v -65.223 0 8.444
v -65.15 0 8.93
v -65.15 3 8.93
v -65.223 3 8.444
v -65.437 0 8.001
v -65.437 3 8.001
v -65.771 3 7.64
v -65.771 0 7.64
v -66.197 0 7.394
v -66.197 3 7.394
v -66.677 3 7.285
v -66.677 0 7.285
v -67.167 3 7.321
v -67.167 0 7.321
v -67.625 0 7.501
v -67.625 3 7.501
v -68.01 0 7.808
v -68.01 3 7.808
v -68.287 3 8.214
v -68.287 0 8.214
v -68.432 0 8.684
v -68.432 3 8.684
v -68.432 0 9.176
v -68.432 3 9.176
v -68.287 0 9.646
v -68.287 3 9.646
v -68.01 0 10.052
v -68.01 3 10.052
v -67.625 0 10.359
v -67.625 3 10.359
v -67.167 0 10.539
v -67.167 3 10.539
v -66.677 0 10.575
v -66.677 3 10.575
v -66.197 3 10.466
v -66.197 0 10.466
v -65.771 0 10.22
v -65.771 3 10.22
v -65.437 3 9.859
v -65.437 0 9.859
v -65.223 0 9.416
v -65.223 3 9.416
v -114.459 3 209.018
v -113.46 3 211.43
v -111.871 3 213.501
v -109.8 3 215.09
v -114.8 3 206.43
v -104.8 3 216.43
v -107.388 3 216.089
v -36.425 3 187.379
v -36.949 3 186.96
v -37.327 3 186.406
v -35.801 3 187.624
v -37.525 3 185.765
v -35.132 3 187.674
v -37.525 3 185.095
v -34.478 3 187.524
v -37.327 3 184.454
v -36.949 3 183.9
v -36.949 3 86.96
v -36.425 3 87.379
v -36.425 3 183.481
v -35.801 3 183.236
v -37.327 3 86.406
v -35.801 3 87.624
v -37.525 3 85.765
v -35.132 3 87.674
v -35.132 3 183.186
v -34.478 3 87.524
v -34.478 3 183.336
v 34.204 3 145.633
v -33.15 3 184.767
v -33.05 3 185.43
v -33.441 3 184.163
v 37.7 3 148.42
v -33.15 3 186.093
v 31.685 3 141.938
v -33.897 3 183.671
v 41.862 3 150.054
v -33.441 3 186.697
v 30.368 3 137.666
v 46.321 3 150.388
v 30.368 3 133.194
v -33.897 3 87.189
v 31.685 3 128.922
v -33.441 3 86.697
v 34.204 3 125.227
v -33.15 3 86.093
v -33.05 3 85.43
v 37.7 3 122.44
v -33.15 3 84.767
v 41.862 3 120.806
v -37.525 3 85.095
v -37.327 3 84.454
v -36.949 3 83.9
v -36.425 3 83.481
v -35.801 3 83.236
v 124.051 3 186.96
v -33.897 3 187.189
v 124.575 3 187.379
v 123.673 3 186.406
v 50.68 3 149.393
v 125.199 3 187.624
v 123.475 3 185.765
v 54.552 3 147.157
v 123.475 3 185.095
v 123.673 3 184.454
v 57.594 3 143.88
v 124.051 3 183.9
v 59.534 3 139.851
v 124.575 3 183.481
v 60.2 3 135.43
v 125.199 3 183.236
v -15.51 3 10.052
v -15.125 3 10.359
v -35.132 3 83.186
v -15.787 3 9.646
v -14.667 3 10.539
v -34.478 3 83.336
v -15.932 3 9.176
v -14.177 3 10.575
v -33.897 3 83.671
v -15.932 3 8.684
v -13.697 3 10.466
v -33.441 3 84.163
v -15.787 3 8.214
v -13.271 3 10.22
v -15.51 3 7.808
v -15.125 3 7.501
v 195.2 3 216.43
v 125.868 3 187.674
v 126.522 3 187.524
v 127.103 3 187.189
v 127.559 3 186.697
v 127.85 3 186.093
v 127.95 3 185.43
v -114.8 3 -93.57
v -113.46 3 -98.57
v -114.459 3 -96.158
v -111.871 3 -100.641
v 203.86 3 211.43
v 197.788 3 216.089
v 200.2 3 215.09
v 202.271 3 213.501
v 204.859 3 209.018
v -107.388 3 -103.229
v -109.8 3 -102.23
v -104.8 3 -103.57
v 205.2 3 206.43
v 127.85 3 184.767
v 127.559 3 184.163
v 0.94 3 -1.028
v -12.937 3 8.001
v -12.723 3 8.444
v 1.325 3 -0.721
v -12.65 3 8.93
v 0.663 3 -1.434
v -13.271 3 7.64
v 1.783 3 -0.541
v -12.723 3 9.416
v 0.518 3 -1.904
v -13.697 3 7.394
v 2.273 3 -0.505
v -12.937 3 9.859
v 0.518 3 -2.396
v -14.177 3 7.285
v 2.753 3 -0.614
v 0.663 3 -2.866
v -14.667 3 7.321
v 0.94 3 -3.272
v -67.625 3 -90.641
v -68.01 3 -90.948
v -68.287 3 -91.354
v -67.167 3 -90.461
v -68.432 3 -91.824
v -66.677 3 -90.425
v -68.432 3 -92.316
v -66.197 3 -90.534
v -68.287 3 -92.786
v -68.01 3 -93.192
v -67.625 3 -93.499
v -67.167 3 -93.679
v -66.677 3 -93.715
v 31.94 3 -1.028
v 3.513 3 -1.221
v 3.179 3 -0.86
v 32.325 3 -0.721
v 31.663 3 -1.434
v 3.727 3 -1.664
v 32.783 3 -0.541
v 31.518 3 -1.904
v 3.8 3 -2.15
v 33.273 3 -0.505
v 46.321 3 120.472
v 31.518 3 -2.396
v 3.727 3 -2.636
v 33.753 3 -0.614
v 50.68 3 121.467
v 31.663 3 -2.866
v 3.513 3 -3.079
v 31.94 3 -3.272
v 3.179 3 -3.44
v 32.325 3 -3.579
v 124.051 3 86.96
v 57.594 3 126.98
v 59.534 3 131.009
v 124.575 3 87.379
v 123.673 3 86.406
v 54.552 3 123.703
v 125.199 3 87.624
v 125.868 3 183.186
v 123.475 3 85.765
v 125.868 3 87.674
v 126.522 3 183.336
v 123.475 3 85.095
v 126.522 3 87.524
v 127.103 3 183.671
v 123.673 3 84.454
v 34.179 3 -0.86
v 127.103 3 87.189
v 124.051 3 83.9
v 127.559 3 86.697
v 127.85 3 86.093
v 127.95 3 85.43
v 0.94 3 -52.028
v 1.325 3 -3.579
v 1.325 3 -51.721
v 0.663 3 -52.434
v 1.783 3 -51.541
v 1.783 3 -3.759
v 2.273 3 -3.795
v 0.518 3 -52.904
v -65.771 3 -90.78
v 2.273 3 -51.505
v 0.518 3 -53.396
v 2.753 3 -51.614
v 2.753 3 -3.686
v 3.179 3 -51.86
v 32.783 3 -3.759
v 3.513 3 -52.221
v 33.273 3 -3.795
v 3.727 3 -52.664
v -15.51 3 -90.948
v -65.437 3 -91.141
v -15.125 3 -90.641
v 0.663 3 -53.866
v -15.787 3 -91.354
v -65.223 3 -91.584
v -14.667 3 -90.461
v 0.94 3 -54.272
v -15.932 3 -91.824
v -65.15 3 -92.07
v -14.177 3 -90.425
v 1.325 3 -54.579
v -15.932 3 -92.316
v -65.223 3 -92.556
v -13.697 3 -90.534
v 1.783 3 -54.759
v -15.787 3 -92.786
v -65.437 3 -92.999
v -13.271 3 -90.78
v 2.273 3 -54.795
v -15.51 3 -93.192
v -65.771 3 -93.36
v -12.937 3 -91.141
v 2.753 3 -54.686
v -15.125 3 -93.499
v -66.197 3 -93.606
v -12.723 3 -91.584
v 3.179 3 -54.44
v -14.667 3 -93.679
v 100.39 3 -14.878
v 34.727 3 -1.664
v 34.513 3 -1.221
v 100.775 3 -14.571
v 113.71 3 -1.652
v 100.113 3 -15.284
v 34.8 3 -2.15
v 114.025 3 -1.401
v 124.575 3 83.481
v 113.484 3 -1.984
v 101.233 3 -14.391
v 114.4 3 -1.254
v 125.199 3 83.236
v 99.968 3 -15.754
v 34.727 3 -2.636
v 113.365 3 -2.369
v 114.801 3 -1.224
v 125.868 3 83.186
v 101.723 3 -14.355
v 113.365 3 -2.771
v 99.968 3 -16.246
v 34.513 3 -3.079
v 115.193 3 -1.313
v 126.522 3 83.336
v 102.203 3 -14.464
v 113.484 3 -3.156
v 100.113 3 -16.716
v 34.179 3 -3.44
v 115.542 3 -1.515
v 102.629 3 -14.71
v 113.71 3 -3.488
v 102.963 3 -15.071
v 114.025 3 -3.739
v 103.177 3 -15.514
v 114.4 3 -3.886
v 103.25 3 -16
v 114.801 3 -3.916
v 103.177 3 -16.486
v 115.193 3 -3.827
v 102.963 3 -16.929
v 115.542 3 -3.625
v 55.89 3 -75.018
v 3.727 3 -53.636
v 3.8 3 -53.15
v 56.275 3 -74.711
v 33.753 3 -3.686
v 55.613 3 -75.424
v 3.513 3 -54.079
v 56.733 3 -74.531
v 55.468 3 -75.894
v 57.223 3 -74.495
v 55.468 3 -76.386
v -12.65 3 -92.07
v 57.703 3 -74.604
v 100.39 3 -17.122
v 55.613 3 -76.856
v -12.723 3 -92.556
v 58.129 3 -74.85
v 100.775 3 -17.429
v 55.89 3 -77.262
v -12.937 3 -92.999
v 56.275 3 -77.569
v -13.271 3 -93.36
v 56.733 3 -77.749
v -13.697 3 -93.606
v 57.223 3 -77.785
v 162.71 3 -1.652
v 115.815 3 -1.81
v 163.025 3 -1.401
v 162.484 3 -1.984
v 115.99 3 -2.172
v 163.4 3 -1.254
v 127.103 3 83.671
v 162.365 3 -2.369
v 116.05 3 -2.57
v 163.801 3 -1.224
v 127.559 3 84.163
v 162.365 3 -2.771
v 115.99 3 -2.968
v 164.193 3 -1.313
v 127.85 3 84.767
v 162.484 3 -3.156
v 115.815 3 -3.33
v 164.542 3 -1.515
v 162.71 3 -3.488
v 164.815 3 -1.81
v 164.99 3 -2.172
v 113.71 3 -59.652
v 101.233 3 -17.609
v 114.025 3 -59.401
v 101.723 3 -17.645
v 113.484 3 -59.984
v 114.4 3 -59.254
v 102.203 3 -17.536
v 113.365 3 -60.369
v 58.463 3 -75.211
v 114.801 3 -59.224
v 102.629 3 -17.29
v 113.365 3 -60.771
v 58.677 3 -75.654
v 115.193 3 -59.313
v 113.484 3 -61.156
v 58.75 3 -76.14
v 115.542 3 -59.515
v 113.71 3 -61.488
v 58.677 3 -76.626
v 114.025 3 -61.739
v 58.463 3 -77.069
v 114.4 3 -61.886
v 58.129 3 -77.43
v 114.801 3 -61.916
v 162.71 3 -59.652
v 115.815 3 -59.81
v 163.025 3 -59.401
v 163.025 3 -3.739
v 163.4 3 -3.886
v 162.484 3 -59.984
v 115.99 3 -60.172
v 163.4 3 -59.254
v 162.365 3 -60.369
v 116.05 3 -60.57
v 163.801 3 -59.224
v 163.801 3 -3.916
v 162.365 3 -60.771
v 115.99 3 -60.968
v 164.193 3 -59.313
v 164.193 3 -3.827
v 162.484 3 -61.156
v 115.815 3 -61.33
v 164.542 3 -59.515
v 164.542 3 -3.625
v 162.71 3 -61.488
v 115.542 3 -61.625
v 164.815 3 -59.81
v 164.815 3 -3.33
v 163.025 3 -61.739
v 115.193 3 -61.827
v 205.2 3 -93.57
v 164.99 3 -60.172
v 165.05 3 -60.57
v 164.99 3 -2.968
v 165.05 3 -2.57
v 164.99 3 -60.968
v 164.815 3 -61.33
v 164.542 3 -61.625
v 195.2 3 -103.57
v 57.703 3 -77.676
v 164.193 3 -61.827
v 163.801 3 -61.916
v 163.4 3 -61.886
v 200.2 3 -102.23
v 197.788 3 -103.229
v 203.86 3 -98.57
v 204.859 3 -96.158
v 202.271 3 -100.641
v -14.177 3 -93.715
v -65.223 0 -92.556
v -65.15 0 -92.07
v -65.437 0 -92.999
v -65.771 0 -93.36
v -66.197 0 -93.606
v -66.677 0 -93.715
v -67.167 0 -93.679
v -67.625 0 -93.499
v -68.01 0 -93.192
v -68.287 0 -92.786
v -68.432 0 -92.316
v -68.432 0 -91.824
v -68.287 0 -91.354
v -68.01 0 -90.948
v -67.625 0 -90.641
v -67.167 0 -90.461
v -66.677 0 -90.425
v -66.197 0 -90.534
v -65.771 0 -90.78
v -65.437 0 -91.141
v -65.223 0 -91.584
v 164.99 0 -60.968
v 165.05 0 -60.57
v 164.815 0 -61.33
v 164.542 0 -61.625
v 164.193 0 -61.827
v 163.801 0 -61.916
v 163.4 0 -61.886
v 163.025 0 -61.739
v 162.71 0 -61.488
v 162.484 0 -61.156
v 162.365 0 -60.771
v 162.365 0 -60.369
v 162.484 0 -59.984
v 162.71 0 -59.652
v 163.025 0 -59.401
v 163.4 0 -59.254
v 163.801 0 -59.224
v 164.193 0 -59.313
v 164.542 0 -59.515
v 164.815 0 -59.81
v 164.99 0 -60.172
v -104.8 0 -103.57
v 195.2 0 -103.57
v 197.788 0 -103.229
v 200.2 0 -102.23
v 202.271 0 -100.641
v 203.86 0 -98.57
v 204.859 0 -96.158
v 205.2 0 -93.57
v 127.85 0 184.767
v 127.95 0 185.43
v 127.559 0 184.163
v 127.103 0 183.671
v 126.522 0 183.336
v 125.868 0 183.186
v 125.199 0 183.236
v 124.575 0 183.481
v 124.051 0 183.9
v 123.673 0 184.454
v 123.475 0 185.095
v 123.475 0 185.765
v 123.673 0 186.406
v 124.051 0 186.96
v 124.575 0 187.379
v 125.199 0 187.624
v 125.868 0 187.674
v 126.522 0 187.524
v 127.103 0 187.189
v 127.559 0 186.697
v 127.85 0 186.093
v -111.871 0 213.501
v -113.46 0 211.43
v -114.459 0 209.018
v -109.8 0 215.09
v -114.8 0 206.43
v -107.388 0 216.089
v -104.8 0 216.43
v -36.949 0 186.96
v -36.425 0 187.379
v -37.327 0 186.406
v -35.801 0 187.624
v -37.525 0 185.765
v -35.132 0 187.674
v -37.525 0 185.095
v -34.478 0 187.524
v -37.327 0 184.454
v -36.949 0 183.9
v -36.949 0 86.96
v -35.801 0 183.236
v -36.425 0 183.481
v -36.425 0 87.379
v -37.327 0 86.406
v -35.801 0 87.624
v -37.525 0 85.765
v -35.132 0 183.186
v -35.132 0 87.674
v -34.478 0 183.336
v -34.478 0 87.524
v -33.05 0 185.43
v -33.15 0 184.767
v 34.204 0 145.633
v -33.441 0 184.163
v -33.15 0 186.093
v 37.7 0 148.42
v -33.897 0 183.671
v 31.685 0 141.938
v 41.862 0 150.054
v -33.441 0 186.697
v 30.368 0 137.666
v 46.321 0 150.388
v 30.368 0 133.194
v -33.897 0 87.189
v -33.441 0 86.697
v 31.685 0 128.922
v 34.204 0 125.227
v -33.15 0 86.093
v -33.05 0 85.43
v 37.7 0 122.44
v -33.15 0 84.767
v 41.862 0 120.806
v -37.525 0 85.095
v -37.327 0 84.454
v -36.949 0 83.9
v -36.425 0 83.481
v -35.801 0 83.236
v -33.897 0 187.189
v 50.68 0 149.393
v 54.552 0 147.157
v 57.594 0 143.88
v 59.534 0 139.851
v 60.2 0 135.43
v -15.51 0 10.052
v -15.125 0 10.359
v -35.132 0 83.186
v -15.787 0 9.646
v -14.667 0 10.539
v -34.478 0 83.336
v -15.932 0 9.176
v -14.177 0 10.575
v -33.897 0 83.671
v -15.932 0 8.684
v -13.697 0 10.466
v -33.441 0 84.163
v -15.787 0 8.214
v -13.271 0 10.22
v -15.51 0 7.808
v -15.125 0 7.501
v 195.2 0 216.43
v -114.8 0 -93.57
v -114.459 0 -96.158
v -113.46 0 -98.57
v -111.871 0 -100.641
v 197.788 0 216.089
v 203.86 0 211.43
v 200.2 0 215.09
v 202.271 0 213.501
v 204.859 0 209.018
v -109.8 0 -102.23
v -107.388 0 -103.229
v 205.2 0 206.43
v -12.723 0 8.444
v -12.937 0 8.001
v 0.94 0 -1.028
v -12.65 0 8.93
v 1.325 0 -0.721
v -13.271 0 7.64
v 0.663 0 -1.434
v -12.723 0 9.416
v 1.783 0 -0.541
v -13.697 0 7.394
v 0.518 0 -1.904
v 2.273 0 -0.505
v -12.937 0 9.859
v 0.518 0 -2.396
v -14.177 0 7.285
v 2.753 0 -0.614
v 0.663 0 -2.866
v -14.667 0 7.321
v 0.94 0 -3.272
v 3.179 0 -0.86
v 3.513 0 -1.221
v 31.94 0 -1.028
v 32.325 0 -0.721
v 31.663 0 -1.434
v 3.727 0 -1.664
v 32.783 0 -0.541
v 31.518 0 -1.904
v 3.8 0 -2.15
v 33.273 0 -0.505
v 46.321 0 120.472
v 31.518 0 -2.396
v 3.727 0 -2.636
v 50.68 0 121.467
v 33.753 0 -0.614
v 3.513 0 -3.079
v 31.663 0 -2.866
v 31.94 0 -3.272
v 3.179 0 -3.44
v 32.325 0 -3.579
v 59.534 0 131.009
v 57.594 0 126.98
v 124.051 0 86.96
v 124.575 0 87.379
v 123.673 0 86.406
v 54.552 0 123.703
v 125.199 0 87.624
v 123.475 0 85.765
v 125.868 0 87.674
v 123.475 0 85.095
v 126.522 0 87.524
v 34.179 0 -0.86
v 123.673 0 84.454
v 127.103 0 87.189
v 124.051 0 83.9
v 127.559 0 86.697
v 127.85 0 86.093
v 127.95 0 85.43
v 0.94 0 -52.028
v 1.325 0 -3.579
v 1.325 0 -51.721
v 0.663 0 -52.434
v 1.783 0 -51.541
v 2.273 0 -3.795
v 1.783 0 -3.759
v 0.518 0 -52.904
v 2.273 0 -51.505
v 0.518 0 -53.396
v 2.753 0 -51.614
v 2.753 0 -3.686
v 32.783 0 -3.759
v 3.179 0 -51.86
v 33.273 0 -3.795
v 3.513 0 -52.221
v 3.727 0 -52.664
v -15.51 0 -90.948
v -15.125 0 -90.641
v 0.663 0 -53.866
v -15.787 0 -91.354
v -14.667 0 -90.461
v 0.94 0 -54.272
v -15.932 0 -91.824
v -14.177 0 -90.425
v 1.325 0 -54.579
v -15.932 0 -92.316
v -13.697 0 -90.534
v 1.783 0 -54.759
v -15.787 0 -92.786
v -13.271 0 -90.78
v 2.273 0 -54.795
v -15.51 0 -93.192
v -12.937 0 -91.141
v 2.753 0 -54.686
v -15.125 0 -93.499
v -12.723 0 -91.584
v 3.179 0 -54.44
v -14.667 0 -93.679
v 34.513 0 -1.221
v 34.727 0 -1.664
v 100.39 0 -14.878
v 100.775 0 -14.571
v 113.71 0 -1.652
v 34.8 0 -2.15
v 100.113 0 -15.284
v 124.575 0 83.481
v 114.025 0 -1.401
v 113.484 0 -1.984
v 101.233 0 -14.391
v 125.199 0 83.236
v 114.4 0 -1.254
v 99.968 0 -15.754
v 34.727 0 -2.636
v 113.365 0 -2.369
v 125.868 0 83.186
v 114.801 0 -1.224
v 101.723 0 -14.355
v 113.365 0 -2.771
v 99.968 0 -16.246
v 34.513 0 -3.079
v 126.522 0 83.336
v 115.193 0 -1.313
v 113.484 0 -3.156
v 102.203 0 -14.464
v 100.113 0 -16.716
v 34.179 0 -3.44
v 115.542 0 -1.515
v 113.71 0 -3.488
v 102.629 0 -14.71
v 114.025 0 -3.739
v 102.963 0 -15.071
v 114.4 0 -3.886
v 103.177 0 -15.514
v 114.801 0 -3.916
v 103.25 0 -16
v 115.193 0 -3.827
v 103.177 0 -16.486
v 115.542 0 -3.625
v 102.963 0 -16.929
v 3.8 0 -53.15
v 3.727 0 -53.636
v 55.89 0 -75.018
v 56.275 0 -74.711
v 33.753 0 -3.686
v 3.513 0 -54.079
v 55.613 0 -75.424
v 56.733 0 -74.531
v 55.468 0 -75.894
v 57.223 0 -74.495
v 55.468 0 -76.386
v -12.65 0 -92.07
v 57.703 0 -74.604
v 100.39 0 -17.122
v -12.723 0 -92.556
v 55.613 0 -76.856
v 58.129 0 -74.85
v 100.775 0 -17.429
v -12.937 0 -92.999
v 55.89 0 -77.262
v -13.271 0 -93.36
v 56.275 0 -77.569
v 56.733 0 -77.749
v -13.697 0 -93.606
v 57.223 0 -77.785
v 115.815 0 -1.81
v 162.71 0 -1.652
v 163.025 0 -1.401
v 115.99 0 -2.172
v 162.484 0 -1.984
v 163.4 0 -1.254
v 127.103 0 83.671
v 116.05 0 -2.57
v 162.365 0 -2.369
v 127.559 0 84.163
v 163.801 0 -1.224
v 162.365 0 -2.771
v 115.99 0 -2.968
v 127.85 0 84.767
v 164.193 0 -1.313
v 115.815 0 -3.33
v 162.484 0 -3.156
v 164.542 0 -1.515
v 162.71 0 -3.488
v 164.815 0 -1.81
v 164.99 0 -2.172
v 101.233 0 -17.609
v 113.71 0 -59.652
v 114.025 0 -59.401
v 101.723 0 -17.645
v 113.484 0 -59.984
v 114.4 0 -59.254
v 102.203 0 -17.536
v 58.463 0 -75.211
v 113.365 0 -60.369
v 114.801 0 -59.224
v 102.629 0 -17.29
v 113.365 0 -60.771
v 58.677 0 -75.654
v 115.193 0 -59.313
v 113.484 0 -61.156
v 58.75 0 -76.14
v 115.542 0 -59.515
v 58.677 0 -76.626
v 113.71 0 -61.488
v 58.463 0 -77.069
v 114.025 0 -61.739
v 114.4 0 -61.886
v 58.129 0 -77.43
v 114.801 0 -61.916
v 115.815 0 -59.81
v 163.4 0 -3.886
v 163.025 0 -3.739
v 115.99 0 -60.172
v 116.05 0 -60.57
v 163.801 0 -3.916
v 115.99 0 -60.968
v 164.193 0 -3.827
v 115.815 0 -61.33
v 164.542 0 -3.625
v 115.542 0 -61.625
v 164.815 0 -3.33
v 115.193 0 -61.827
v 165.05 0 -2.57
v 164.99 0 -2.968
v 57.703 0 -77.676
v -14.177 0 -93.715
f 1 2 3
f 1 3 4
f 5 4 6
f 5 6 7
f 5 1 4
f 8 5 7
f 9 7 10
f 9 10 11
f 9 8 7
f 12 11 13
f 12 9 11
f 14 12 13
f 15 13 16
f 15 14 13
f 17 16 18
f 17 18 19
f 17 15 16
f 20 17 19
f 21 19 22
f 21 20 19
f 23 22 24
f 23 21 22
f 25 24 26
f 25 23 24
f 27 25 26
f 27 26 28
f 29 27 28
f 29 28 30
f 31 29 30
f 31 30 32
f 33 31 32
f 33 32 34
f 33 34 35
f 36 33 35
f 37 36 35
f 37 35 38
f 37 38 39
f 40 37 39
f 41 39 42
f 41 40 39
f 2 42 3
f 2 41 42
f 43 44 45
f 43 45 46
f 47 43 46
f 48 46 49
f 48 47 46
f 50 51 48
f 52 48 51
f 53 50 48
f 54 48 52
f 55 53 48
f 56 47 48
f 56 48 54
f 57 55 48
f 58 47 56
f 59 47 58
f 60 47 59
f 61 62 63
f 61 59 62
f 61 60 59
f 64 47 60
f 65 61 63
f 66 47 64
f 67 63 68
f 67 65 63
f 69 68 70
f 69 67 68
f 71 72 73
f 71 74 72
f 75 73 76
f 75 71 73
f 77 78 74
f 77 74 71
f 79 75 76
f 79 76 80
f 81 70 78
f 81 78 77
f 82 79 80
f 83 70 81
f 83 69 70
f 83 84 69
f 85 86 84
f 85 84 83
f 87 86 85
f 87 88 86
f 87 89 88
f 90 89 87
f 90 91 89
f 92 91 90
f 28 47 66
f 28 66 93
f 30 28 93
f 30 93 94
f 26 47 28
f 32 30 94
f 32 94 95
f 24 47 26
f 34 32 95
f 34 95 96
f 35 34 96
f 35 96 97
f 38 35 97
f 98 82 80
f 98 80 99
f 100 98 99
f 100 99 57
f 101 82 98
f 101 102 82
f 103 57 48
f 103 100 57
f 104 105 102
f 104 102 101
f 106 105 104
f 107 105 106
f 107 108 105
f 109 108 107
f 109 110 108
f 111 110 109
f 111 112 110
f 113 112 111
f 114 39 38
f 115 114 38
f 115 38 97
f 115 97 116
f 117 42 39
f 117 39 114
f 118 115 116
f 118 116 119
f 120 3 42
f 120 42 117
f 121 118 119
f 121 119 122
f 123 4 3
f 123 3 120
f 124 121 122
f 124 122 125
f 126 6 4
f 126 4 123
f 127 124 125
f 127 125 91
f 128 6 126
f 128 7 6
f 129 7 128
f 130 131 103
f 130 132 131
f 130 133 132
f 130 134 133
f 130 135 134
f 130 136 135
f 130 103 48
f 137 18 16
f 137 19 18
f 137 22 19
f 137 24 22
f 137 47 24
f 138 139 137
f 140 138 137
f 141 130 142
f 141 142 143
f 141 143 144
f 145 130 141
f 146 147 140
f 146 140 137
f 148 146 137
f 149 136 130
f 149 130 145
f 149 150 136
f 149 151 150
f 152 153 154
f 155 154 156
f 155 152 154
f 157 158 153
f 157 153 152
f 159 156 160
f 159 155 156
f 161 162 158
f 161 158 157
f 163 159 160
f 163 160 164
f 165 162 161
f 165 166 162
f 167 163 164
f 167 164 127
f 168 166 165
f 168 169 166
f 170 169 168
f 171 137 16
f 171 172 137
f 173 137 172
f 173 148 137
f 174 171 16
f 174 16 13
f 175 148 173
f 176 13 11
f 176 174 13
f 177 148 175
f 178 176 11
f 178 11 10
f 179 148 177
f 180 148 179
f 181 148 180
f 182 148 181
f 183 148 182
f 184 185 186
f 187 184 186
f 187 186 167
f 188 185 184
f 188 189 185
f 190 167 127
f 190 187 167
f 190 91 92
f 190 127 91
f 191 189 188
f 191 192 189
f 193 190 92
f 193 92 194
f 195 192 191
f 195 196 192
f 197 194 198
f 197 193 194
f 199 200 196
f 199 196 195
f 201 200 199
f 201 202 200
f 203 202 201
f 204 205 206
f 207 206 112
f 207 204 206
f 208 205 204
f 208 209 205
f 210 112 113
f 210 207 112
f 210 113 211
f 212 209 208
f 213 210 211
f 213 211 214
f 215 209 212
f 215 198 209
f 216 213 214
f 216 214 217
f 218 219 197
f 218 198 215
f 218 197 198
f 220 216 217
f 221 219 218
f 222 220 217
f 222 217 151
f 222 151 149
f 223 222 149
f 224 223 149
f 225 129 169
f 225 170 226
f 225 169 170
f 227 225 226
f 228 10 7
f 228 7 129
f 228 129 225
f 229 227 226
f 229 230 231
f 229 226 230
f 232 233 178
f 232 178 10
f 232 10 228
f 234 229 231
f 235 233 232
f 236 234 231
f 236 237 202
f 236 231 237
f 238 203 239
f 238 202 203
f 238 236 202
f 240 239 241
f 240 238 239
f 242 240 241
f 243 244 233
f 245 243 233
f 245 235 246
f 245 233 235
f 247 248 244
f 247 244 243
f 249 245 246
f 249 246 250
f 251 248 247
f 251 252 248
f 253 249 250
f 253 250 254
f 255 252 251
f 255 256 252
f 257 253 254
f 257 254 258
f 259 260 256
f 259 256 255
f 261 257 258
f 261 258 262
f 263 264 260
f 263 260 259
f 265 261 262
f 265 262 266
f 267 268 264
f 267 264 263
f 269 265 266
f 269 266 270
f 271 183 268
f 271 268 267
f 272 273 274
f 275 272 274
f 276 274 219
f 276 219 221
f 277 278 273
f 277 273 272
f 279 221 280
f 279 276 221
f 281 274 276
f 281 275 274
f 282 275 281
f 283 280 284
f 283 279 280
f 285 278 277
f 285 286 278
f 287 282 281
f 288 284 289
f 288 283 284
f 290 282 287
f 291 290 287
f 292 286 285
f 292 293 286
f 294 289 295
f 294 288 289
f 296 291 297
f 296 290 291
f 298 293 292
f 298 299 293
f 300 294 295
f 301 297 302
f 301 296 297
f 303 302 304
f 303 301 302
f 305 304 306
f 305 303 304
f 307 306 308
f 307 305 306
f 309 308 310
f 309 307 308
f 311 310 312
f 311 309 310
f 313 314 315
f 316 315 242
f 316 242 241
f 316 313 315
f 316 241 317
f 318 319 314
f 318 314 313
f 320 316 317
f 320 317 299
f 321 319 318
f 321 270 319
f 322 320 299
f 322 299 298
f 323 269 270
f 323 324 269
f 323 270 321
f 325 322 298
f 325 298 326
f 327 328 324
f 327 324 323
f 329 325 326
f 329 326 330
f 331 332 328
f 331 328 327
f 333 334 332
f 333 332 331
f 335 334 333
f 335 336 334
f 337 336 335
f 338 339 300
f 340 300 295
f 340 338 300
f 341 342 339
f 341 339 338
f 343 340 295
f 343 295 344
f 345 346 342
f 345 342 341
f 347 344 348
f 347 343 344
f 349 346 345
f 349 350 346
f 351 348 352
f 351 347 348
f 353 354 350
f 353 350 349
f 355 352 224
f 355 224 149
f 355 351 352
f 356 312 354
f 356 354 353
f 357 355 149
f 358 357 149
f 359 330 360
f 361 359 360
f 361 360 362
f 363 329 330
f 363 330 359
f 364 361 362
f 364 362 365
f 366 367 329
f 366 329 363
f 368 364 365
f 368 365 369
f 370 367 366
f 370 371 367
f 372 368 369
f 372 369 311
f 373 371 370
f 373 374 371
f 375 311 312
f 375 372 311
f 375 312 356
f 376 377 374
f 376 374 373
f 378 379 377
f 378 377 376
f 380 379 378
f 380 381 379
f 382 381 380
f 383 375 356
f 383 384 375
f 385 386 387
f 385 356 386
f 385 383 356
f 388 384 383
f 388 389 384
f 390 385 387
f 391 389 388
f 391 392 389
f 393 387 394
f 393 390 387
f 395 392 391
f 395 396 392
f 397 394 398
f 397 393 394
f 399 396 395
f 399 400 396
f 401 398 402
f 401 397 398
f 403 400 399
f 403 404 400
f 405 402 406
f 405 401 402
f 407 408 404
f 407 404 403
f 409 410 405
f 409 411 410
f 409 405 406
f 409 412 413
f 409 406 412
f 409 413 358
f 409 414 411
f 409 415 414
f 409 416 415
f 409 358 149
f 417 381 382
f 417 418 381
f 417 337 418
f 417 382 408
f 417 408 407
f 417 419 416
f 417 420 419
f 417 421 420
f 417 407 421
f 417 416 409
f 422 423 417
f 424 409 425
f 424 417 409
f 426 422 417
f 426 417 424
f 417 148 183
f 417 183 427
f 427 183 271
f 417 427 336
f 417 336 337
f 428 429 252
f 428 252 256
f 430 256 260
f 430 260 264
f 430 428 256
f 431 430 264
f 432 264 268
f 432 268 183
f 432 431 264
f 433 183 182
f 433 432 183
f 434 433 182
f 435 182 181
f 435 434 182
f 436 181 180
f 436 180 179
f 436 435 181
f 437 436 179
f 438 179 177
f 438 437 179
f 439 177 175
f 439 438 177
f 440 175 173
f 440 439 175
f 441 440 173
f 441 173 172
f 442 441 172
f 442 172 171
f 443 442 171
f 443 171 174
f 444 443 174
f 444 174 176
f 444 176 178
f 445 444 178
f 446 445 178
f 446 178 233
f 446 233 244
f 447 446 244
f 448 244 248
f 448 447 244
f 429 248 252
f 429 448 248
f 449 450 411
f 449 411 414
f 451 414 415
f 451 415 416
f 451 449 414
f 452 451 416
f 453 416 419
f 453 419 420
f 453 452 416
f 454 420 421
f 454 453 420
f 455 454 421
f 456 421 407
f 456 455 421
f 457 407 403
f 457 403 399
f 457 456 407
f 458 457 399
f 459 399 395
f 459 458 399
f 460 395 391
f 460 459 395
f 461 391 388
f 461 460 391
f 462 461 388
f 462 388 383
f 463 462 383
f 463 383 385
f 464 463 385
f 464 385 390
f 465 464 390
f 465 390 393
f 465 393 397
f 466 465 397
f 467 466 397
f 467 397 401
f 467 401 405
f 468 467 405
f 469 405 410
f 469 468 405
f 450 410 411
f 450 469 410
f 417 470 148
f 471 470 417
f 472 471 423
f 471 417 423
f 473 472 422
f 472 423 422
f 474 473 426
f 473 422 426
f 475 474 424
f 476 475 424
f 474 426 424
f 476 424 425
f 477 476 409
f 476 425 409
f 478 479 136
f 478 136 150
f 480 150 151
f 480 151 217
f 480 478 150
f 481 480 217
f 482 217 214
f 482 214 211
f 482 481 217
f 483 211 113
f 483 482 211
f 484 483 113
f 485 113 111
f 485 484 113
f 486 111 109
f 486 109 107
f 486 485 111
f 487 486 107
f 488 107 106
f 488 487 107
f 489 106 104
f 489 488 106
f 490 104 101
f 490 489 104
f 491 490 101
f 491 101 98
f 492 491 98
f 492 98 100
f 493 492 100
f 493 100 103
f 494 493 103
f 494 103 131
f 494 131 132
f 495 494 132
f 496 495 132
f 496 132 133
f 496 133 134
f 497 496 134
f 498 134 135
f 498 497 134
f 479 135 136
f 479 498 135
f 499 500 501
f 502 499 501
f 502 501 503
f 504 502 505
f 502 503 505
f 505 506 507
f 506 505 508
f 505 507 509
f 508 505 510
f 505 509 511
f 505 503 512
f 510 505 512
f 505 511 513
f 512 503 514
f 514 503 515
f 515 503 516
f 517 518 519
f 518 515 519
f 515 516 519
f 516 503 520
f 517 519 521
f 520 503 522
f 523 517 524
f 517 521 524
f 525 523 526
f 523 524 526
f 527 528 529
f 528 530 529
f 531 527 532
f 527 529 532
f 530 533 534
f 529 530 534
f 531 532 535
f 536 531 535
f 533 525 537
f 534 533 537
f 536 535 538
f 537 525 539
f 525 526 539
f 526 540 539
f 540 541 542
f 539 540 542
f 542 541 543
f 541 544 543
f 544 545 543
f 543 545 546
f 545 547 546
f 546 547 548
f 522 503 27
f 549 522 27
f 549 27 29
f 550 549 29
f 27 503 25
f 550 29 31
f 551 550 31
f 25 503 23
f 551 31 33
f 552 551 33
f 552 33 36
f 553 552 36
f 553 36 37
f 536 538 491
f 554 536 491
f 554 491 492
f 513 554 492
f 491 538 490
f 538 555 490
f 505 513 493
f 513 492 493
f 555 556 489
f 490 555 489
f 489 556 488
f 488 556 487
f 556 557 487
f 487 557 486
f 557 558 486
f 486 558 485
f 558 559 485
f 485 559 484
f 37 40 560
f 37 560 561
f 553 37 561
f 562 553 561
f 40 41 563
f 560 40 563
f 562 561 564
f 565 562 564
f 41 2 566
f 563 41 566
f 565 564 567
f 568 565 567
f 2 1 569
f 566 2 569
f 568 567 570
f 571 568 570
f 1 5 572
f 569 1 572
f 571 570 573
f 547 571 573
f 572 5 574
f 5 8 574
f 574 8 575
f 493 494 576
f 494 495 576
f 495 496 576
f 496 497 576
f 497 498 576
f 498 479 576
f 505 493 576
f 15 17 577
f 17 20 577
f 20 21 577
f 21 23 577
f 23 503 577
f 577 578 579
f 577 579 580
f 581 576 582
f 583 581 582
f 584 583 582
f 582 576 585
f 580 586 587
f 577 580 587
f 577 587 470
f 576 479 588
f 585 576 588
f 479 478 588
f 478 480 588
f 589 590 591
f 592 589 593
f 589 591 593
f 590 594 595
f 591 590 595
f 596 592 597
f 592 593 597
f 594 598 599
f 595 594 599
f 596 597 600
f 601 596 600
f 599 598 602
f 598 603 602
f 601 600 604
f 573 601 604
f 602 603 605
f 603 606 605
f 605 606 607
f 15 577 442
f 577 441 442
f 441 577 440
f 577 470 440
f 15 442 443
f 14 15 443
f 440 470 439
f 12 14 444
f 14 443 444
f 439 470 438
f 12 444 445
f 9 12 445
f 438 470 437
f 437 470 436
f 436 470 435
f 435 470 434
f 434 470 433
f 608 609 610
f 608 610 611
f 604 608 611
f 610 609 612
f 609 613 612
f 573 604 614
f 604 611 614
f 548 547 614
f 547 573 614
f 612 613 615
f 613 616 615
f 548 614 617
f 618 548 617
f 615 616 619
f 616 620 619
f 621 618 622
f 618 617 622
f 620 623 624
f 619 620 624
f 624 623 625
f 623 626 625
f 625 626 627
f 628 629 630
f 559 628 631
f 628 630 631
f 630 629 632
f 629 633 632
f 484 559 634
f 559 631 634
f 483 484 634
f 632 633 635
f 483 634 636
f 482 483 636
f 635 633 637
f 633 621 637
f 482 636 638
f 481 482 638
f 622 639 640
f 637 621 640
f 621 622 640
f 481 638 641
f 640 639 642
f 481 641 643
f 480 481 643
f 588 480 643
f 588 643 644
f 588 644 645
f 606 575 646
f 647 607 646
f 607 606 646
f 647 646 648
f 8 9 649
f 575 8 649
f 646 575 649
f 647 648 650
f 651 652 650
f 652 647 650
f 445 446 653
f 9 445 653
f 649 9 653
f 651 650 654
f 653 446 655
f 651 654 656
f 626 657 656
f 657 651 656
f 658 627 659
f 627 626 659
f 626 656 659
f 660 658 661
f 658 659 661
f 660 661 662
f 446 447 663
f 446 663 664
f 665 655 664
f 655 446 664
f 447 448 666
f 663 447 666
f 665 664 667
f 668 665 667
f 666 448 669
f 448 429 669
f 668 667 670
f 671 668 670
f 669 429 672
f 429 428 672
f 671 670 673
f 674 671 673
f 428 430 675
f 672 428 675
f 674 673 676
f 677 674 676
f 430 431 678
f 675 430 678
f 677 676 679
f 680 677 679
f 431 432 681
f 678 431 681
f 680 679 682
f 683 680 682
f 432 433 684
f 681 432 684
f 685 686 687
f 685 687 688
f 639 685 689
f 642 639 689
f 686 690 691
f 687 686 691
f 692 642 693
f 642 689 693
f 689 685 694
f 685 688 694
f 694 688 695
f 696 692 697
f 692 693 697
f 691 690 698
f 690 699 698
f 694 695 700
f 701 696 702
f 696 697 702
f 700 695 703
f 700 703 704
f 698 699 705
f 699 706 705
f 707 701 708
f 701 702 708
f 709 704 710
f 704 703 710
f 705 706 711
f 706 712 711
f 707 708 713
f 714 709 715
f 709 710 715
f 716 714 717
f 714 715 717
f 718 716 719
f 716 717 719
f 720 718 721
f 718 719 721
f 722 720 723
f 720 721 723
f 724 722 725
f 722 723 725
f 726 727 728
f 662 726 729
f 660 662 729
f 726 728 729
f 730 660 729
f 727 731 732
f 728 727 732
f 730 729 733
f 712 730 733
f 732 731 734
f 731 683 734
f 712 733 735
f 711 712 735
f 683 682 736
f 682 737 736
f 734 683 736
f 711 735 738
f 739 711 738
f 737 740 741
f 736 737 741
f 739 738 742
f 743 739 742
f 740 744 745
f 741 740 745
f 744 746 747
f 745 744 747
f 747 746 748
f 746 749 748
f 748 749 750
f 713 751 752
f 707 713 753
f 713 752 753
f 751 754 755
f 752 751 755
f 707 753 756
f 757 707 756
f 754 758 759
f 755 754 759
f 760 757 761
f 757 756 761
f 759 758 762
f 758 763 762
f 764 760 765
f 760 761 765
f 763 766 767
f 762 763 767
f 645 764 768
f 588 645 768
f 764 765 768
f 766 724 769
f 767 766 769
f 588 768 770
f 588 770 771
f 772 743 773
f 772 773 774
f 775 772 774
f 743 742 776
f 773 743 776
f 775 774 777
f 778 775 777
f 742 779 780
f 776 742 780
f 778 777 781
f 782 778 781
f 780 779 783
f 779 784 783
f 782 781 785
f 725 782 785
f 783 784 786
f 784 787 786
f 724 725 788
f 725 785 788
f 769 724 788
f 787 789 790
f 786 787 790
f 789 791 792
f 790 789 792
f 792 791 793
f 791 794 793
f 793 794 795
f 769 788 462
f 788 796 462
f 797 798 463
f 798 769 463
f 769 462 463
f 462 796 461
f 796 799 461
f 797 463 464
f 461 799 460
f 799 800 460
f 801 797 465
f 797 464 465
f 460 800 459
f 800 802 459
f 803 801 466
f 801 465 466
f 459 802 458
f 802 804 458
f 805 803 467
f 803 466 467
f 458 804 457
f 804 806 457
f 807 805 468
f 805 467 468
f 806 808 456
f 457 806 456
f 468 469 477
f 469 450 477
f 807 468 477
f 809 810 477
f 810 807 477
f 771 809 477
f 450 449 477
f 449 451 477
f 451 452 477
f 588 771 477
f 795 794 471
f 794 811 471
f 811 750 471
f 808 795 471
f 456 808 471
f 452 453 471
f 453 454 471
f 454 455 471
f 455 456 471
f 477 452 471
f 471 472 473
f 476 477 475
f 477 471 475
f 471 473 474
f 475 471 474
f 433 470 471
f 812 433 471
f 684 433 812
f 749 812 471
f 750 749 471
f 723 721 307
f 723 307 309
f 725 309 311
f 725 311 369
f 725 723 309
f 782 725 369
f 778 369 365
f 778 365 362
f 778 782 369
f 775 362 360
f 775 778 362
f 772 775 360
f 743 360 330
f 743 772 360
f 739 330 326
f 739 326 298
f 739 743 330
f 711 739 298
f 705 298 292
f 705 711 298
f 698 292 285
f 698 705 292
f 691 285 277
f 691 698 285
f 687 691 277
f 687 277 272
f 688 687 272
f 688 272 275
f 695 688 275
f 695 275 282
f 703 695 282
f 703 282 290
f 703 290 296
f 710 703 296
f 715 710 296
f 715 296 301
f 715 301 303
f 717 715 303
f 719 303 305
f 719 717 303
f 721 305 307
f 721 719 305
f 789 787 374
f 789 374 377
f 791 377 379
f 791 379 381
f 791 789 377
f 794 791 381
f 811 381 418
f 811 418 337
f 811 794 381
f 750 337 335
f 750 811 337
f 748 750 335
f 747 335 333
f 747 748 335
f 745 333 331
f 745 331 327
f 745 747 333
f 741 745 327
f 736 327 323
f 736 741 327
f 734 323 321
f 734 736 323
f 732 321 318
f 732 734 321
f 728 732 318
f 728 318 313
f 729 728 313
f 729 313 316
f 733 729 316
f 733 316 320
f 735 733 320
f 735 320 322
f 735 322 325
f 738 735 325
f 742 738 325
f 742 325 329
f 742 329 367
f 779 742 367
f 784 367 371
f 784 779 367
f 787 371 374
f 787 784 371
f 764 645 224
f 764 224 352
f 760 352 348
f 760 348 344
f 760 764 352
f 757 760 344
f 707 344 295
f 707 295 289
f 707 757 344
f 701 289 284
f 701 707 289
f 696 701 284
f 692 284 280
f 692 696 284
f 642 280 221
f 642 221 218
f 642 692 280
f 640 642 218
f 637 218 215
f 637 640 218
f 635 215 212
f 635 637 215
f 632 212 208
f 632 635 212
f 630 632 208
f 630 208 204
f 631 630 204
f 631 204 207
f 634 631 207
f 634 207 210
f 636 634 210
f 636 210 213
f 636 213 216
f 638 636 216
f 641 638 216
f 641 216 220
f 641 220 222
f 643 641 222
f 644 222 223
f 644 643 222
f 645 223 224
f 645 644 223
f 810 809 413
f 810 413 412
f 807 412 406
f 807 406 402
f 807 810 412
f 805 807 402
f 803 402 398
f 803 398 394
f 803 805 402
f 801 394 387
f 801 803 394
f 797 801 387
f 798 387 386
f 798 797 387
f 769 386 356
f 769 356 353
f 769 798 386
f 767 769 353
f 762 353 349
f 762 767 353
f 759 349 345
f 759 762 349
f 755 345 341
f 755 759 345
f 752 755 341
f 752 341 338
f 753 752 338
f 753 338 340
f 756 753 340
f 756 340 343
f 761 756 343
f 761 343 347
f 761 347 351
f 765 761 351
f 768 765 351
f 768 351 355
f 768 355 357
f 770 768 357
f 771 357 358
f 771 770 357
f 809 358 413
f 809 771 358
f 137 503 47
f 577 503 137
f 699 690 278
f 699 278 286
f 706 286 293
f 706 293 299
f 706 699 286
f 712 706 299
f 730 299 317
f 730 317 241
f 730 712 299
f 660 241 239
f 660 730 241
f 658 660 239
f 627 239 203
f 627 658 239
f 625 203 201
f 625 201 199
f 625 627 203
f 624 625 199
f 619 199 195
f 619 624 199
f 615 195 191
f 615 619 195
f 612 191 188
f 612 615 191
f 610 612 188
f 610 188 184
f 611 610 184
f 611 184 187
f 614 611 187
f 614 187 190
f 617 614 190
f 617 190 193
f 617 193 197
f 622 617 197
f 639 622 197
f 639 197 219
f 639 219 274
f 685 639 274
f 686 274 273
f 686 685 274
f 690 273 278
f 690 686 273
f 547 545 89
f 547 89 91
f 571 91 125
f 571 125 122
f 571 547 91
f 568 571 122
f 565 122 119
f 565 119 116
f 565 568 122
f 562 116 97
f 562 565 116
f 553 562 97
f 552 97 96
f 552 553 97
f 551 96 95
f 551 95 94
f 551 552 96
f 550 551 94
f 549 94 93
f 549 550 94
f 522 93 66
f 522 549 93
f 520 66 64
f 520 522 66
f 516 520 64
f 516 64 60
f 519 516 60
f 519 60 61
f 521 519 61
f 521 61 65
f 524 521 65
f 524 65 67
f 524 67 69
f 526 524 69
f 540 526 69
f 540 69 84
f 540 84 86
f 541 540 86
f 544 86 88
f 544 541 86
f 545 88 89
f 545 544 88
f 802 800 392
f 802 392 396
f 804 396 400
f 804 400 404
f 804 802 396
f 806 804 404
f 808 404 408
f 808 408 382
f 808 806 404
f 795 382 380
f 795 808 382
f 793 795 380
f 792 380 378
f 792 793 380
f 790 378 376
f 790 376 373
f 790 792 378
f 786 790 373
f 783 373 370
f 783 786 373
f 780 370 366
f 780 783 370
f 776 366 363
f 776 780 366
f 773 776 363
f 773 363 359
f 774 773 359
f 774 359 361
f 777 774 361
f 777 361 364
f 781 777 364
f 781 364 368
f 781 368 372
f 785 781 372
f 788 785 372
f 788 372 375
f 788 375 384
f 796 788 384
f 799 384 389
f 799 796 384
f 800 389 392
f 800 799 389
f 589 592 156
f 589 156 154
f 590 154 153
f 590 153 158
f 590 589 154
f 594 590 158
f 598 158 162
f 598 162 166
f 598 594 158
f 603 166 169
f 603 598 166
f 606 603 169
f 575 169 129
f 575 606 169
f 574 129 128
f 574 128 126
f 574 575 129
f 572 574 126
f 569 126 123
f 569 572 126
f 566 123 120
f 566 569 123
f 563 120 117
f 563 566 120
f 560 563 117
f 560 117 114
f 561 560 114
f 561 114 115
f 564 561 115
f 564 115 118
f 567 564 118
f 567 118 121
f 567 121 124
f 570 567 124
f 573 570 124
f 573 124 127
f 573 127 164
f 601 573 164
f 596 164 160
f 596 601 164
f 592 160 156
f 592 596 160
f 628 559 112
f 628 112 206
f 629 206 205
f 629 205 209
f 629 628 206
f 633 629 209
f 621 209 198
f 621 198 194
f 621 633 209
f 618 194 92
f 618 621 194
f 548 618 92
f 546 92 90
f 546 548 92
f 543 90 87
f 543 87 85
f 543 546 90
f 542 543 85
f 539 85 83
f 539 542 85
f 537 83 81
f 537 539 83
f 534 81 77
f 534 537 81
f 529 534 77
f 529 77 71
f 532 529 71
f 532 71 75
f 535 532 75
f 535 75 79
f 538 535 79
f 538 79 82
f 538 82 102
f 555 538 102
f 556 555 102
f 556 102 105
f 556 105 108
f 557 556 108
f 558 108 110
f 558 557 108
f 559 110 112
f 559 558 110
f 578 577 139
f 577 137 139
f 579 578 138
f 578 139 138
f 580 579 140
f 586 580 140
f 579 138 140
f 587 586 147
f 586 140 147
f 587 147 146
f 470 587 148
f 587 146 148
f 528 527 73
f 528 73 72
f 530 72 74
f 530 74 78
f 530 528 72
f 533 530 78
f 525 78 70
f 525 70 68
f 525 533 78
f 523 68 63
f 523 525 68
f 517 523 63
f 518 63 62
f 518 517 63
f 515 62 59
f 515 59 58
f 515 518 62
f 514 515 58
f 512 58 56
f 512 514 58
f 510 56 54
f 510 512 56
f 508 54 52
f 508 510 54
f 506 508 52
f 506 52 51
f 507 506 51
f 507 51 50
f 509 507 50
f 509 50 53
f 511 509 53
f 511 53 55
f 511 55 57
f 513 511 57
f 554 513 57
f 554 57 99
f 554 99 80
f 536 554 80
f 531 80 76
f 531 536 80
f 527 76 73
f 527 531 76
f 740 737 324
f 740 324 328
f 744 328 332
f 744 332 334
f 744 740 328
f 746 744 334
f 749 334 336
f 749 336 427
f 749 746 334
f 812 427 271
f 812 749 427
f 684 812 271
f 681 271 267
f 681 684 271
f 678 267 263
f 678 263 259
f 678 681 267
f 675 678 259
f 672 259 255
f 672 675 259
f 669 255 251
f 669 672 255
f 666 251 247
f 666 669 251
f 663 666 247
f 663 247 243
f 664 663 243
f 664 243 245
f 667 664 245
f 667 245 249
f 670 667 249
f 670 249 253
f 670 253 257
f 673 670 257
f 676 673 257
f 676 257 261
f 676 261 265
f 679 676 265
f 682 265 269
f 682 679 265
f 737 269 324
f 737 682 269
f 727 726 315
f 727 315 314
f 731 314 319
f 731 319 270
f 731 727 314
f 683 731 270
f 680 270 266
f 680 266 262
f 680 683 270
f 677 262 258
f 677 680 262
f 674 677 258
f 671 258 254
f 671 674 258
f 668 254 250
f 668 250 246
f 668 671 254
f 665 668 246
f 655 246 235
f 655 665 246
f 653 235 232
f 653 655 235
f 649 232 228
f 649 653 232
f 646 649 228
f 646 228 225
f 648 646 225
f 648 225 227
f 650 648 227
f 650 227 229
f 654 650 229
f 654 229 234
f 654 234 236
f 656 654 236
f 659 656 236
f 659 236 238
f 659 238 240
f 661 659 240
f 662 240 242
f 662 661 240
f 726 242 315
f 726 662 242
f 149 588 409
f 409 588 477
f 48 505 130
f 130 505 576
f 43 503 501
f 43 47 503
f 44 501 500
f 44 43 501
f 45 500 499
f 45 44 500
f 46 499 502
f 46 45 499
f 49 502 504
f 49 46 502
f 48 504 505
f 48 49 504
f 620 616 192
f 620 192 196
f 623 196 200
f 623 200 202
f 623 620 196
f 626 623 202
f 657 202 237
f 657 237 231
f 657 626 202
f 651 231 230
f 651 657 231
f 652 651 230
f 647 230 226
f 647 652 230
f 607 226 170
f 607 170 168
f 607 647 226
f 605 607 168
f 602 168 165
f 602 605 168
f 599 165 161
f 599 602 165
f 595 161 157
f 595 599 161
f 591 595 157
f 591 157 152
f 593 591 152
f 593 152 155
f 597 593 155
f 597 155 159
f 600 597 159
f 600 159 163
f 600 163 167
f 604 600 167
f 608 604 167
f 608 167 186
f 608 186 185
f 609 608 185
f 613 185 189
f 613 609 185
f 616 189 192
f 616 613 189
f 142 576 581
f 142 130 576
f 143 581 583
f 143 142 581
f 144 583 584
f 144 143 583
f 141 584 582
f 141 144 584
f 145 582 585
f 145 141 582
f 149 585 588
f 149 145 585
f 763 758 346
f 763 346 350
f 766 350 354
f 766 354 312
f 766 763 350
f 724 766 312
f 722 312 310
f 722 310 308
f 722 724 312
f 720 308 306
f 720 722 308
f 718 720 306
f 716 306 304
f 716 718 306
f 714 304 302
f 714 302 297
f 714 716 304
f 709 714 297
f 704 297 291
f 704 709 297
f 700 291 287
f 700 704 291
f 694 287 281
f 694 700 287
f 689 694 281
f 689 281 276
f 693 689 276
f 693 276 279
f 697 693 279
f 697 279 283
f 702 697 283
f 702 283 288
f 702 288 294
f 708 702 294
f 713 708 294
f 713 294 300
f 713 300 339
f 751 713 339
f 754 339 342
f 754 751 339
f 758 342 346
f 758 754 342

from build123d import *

# Parameters (mm, degrees)
SKETCH1_W           = 320
SKETCH1_H           = 320
SKETCH1_R           = 1.65
SKETCH1_R_2         = 1.35
SKETCH1_R_3         = 2.25
SKETCH1_R_4         = 15
BOSS_EXTRUDE1_DEPTH = 3
FILLET1_R           = 10


with BuildPart() as part:
    # Sketch1 → Boss-Extrude1 (new body)
    with BuildSketch(Plane(origin=(0, 0, 0), x_dir=(1, 0, 0), z_dir=(0, 1, 0))):
        with Locations((45.2, -56.43)):
            Rectangle(SKETCH1_W, SKETCH1_H)
        with Locations((101.6, 16)):
            Circle(SKETCH1_R, mode=Mode.SUBTRACT)
        with Locations((2.15, 2.15)):
            Circle(SKETCH1_R, mode=Mode.SUBTRACT)
        with Locations((33.15, 2.15)):
            Circle(SKETCH1_R, mode=Mode.SUBTRACT)
        with Locations((2.15, 53.15)):
            Circle(SKETCH1_R, mode=Mode.SUBTRACT)
        with Locations((57.1, 76.14)):
            Circle(SKETCH1_R, mode=Mode.SUBTRACT)
        with Locations((163.7, 2.57)):
            Circle(SKETCH1_R_2, mode=Mode.SUBTRACT)
        with Locations((114.7, 2.57)):
            Circle(SKETCH1_R_2, mode=Mode.SUBTRACT)
        with Locations((163.7, 60.57)):
            Circle(SKETCH1_R_2, mode=Mode.SUBTRACT)
        with Locations((114.7, 60.57)):
            Circle(SKETCH1_R_2, mode=Mode.SUBTRACT)
        with Locations((-14.3, -8.93)):
            Circle(SKETCH1_R, mode=Mode.SUBTRACT)
        with Locations((-66.8, -8.93)):
            Circle(SKETCH1_R, mode=Mode.SUBTRACT)
        with Locations((-14.3, 92.07)):
            Circle(SKETCH1_R, mode=Mode.SUBTRACT)
        with Locations((-66.8, 92.07)):
            Circle(SKETCH1_R, mode=Mode.SUBTRACT)
        with Locations((-35.3, -85.43)):
            Circle(SKETCH1_R_3, mode=Mode.SUBTRACT)
        with Locations((125.7, -85.43)):
            Circle(SKETCH1_R_3, mode=Mode.SUBTRACT)
        with Locations((125.7, -185.43)):
            Circle(SKETCH1_R_3, mode=Mode.SUBTRACT)
        with Locations((-35.3, -185.43)):
            Circle(SKETCH1_R_3, mode=Mode.SUBTRACT)
        with Locations((45.2, -135.43)):
            Circle(SKETCH1_R_4, mode=Mode.SUBTRACT)
    extrude(amount=BOSS_EXTRUDE1_DEPTH)

    # Fillet1
    fillet1_edges = [part.edges().sort_by_distance(p)[0] for p in [
        (205.2, 1.5, 216.43),
        (-114.8, 1.5, 216.43),
        (-114.8, 1.5, -103.57),
        (205.2, 1.5, -103.57),
    ]]
    fillet(fillet1_edges, radius=FILLET1_R)


solid = part.part
